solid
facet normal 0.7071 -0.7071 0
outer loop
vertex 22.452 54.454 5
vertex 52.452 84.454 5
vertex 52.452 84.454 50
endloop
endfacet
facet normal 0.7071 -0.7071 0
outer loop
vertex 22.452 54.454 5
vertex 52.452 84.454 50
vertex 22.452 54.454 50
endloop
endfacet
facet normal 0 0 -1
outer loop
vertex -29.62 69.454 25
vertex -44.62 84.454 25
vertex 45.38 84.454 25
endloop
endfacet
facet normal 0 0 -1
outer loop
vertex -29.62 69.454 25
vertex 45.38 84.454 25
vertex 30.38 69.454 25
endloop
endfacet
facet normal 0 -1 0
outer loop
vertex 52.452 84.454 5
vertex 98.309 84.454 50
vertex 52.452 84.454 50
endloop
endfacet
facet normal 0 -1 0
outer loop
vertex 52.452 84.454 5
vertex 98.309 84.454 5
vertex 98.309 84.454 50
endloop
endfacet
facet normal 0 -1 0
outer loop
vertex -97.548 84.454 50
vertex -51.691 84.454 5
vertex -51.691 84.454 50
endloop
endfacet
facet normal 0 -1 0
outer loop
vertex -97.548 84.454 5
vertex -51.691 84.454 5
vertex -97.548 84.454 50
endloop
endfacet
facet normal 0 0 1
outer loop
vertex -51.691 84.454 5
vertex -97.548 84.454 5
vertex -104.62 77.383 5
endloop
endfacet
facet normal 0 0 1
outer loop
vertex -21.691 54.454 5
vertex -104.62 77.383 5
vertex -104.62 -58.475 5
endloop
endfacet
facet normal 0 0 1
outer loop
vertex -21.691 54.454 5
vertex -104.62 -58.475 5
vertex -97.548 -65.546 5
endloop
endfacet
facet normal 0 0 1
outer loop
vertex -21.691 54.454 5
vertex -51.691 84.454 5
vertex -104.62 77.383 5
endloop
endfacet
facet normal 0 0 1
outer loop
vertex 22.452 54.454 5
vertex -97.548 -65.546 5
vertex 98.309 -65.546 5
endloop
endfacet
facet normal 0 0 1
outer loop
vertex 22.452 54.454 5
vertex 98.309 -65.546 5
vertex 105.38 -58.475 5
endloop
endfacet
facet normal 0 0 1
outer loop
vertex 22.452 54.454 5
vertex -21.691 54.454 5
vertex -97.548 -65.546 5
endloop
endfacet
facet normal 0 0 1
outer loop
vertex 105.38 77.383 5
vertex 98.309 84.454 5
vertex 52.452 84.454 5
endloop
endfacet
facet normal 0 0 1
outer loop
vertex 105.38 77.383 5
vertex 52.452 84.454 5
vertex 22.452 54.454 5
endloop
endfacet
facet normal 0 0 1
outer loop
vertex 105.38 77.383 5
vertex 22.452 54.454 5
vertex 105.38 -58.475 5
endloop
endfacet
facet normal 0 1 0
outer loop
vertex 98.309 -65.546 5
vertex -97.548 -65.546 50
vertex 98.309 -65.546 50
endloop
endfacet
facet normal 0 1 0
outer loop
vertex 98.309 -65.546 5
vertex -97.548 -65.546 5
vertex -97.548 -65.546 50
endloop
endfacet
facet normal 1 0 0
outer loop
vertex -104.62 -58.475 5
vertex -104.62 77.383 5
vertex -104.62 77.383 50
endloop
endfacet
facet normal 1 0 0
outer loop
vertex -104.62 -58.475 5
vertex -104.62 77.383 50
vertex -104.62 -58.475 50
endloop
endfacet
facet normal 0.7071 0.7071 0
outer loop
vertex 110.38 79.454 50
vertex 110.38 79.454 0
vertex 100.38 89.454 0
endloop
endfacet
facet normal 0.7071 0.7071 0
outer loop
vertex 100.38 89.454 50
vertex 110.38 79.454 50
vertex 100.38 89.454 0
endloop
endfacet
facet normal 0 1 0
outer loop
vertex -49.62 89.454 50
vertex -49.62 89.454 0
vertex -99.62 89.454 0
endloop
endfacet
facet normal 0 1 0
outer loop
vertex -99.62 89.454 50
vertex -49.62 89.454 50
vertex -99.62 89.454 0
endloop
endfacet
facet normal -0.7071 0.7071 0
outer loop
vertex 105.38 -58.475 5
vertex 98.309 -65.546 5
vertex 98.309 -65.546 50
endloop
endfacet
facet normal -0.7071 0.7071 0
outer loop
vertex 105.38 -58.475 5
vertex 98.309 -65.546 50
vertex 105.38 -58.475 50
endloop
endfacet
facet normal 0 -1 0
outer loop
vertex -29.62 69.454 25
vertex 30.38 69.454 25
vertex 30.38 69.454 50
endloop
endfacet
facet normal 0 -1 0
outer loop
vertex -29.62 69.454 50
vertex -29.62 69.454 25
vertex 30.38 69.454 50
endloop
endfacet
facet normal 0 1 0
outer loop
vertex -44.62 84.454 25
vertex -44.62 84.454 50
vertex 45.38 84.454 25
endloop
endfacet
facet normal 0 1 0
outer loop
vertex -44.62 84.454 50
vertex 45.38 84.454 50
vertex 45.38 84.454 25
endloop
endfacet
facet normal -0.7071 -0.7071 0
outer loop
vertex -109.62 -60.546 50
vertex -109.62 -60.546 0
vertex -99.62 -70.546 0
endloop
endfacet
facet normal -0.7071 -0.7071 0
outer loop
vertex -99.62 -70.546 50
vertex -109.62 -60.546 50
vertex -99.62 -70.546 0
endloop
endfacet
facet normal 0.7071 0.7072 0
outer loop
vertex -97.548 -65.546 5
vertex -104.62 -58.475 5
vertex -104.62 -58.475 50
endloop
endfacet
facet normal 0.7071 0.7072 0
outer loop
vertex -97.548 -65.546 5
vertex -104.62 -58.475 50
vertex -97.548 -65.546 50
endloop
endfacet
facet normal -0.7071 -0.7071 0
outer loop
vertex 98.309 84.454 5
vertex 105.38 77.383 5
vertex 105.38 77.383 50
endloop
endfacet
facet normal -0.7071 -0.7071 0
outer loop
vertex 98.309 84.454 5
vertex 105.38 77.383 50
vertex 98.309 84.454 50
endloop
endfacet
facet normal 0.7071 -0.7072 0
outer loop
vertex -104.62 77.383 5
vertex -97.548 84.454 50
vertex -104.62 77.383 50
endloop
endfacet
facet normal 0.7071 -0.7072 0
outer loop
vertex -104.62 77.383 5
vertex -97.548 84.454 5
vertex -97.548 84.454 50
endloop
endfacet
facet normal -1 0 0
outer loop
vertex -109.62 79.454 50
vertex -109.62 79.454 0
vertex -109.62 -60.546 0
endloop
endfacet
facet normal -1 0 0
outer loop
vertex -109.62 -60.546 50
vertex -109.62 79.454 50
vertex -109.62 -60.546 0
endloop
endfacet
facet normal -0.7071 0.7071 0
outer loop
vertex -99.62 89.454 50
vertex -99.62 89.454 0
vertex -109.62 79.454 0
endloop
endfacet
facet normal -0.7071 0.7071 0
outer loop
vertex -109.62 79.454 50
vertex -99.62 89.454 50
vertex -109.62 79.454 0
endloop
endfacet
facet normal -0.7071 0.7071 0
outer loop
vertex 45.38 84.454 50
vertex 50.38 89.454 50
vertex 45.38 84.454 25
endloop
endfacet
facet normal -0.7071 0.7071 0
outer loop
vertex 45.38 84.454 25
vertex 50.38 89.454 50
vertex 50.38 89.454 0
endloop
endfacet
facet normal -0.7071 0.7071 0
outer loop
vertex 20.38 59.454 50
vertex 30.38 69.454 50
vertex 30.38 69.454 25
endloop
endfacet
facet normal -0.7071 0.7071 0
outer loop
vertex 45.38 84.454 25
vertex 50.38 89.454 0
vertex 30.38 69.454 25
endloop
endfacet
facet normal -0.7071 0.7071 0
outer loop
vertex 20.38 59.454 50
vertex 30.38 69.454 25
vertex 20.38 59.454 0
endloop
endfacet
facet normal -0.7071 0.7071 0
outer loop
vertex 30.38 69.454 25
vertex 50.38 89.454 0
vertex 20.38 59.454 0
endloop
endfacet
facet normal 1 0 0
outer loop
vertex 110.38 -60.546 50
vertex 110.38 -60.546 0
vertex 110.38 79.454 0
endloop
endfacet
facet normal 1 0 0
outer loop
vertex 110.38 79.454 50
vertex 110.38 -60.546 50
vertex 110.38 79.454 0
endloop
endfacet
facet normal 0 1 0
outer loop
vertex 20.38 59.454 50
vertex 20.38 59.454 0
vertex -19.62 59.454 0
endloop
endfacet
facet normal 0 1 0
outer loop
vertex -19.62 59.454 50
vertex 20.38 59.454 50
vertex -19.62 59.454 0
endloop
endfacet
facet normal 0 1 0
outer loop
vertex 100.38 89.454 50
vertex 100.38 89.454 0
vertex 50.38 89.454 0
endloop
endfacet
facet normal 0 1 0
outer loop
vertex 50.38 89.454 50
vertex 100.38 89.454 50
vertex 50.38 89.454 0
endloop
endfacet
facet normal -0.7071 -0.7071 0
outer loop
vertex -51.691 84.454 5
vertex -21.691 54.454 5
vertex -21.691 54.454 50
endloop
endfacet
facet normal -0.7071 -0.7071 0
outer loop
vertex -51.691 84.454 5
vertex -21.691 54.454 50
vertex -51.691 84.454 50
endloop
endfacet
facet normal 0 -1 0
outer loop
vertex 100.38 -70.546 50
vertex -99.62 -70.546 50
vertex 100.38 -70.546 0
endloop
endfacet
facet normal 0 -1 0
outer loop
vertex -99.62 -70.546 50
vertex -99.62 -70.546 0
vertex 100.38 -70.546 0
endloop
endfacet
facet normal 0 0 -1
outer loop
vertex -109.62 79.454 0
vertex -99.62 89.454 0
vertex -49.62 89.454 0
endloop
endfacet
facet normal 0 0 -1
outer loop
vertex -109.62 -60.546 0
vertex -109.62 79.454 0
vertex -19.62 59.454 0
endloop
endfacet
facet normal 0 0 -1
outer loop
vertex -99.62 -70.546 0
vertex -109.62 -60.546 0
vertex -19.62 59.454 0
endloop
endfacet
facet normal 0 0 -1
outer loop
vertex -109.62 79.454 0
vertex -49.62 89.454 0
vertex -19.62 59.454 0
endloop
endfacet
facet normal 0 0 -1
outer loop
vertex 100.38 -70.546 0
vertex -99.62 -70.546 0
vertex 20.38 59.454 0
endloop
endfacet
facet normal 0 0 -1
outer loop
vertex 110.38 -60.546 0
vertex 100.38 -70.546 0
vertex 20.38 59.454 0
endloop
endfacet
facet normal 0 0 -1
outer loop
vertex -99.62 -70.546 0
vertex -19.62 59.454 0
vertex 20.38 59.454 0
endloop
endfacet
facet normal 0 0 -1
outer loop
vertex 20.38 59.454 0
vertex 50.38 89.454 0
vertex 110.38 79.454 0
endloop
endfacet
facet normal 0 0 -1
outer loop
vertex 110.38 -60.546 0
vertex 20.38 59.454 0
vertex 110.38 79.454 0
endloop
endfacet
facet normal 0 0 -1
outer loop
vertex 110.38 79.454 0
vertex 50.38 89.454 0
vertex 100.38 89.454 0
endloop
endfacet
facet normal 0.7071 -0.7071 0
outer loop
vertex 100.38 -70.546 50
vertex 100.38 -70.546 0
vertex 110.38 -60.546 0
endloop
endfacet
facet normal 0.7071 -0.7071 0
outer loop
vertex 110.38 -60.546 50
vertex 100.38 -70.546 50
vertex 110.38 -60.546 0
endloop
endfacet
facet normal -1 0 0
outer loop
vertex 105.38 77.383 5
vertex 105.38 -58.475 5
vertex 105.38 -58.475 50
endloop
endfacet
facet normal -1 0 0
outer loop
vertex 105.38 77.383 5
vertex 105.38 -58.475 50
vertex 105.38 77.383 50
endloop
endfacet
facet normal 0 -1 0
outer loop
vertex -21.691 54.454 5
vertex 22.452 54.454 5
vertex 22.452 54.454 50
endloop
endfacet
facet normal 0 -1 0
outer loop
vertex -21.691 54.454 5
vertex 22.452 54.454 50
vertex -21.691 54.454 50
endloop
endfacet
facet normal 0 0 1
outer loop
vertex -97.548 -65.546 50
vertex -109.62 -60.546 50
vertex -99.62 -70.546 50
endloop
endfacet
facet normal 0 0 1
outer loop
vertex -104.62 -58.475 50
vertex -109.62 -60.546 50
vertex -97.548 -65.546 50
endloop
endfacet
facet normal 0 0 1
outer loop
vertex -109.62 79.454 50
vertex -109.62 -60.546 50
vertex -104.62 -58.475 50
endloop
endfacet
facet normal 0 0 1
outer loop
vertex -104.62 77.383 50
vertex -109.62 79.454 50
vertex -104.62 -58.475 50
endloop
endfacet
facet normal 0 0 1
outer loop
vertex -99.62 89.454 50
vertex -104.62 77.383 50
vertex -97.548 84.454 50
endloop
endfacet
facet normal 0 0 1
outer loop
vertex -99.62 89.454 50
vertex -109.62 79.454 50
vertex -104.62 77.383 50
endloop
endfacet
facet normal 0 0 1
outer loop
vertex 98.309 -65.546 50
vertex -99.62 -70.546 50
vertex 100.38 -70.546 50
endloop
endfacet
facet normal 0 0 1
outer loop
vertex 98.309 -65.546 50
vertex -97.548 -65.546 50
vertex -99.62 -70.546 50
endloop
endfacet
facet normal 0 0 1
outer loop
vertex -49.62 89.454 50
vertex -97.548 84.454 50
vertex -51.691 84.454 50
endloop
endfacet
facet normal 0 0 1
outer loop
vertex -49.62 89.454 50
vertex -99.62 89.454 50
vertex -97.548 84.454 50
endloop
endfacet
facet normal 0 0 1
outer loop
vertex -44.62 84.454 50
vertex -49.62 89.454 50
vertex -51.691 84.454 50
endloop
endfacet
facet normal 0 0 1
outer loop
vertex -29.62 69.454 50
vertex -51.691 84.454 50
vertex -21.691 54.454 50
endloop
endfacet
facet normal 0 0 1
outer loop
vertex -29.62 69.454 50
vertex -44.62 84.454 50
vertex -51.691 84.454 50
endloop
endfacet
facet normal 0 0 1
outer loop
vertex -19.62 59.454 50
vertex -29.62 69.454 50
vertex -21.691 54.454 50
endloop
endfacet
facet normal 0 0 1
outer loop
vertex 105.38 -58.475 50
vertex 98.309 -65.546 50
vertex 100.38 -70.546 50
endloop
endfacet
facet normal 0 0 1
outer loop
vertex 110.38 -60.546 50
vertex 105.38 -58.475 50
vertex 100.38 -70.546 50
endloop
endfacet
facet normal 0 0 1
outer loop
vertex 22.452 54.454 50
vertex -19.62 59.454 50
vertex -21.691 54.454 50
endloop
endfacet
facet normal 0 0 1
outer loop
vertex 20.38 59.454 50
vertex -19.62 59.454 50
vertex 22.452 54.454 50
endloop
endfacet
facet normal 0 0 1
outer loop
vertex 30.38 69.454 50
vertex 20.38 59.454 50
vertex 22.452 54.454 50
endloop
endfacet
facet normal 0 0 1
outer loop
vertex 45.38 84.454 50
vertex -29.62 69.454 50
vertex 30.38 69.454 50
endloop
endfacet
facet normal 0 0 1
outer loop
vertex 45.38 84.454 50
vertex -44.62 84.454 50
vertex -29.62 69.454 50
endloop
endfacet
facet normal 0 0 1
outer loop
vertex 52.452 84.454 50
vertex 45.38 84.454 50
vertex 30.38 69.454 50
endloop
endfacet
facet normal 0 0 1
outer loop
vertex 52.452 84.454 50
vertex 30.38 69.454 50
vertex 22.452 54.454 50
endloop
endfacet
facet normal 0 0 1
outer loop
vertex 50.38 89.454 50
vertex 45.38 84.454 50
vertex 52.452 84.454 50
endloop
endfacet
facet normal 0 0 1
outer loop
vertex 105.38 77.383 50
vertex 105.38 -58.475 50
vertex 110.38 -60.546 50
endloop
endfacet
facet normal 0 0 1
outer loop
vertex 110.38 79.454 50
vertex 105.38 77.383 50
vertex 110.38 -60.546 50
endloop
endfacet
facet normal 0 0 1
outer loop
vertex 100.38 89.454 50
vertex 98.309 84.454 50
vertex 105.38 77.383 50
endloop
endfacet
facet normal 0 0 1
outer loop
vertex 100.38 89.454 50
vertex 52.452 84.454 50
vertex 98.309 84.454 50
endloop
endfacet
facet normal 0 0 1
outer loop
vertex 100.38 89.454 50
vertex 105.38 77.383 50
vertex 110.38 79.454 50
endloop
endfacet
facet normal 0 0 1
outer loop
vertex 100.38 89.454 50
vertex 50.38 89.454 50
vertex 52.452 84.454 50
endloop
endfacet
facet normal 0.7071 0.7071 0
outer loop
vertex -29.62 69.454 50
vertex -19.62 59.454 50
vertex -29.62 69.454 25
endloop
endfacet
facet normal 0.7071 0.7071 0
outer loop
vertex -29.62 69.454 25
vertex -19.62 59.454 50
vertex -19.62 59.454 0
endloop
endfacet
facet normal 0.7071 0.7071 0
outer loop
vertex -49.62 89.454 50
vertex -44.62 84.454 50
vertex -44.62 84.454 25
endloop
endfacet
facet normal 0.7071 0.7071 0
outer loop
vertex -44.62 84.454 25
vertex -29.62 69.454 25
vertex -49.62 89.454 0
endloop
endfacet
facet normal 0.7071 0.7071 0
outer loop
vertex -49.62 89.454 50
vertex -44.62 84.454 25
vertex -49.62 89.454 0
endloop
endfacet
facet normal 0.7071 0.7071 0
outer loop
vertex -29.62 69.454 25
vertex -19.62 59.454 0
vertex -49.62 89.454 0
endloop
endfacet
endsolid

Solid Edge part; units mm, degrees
sketch "Sketch1" plane through (0, 0, 0) normal (0, 0, 1) x (1, 0, 0)
  line L0 (-109.6195, 79.4537) -> (-109.6195, -60.5463)
  line L1 (-109.6195, -60.5463) -> (-99.6195, -70.5463)
  line L2 (-99.6195, -70.5463) -> (100.3805, -70.5463)
  line L3 (100.3805, -70.5463) -> (110.3805, -60.5463)
  line L4 (110.3805, -60.5463) -> (110.3805, 79.4537)
  line L5 (110.3805, 79.4537) -> (100.3805, 89.4537)
  line L6 (100.3805, 89.4537) -> (50.3805, 89.4537)
  line L7 (50.3805, 89.4537) -> (20.3805, 59.4537)
  line L8 (20.3805, 59.4537) -> (-19.6195, 59.4537)
  line L9 (-19.6195, 59.4537) -> (-49.6195, 89.4537)
  line L10 (-49.6195, 89.4537) -> (-99.6195, 89.4537)
  line L11 (-99.6195, 89.4537) -> (-109.6195, 79.4537)
  dimension "D1" = 220
  dimension "D2" = 160
  dimension "D3" = 10
  dimension "D4" = 100
  dimension "D5" = 30
extrude "Outside_ThinWallOptions" add sketch "Sketch1" along normal blind 50
shell "Inside" thickness 5 removed faces 1 at (-75.1528, -42.2796, 50)
sketch "Sketch2" plane through (0, 0, 0) normal (1, 0, 0) x (0, 1, 0)
  line L0 (84.4537, 25) -> (69.4537, 25)
  line L1 (69.4537, 25) -> (69.4537, 50)
  line L2 (69.4537, 50) -> (84.4537, 50)
  line L3 (84.4537, 50) -> (84.4537, 25)
  dimension "D1" = 25
  dimension "D2" = 15
  dimension "D3" = 10
  dimension "D4" = 25
extrude "Protrusion1" add sketch "Sketch2" against normal up to next and the other way up to next
